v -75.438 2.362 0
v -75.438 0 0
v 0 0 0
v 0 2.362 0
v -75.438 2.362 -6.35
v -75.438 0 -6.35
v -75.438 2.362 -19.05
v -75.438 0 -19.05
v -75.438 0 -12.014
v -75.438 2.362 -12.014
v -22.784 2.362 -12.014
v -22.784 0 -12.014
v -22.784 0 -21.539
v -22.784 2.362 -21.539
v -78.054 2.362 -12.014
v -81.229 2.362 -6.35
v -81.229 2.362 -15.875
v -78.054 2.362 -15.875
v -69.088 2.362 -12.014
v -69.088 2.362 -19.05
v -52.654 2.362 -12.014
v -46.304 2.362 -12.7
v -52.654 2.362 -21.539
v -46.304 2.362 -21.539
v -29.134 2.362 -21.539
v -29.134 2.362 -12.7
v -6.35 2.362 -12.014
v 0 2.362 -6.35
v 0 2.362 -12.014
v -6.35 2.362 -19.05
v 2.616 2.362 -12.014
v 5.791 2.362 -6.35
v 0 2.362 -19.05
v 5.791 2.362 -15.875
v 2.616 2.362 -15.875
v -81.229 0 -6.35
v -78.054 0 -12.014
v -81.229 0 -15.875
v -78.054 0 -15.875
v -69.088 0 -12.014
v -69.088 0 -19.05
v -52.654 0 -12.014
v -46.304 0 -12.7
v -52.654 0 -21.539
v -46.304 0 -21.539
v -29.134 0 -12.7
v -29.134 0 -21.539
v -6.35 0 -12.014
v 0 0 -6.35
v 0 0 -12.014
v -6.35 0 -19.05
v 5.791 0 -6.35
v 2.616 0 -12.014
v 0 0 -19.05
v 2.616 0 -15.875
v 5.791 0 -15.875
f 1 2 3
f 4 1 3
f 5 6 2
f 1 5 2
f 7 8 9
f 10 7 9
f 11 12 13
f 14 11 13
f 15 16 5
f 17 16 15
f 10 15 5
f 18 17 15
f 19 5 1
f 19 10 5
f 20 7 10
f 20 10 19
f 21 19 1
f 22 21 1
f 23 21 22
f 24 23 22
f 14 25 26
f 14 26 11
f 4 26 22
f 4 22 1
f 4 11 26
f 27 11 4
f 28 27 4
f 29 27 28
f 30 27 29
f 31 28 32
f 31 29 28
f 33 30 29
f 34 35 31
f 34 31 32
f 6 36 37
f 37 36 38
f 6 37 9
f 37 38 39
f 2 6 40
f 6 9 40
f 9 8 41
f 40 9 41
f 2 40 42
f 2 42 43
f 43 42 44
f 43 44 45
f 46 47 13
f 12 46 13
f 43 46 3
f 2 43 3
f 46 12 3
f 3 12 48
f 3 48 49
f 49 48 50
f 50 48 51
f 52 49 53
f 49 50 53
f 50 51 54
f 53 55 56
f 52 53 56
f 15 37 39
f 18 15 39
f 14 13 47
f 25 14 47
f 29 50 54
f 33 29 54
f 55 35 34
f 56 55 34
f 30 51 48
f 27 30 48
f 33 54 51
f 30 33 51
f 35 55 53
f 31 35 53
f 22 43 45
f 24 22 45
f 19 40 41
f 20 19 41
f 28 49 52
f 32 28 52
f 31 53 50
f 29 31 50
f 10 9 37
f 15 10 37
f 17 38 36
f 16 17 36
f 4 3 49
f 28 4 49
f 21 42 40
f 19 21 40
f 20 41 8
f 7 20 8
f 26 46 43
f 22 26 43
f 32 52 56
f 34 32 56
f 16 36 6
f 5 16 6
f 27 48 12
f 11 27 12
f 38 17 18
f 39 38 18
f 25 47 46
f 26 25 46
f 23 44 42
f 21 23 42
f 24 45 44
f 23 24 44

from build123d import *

# Parameters (mm, degrees)
BOSS_EXTRUDE1_DEPTH = 2.3622
SKETCH2_W           = 3.175
SKETCH2_H           = 3.175
CUT_EXTRUDE1_DEPTH  = 2.54


with BuildPart() as part:
    # Sketch1 → Boss-Extrude1 (new body)
    with BuildSketch(Plane(origin=(0, 0, 0), x_dir=(1, 0, 0), z_dir=(0, 1, 0))):
        Polygon((5.7912, 6.35), (5.7912, 19.05), (2.6162, 19.05), (2.6162, 12.0142), (0, 12.0142), (0, 19.05), (-6.35, 19.05), (-6.35, 12.0142), (-22.7838, 12.0142), (-22.7838, 21.5392), (-29.1338, 21.5392), (-29.1338, 12.7), (-46.3042, 12.7), (-46.3042, 21.5392), (-52.6542, 21.5392), (-52.6542, 12.0142), (-69.088, 12.0142), (-69.088, 19.05), (-75.438, 19.05), (-75.438, 12.0142), (-78.0542, 12.0142), (-78.0542, 19.05), (-81.2292, 19.05), (-81.2292, 6.35), (-75.438, 6.35), (-75.438, 0), (0, 0), (0, 6.35), align=None)
    extrude(amount=BOSS_EXTRUDE1_DEPTH)

    # Sketch2 → Cut-Extrude1 (cut)
    with BuildSketch(Plane(origin=(0, 2.3622, 0), x_dir=(1, 0, 0), z_dir=(0, 1, 0))):
        with Locations((4.2037, 17.4625)):
            Rectangle(SKETCH2_W, SKETCH2_H)
        with Locations((-79.6417, 17.4625)):
            Rectangle(SKETCH2_W, SKETCH2_H)
    extrude(amount=-CUT_EXTRUDE1_DEPTH, mode=Mode.SUBTRACT)


solid = part.part
